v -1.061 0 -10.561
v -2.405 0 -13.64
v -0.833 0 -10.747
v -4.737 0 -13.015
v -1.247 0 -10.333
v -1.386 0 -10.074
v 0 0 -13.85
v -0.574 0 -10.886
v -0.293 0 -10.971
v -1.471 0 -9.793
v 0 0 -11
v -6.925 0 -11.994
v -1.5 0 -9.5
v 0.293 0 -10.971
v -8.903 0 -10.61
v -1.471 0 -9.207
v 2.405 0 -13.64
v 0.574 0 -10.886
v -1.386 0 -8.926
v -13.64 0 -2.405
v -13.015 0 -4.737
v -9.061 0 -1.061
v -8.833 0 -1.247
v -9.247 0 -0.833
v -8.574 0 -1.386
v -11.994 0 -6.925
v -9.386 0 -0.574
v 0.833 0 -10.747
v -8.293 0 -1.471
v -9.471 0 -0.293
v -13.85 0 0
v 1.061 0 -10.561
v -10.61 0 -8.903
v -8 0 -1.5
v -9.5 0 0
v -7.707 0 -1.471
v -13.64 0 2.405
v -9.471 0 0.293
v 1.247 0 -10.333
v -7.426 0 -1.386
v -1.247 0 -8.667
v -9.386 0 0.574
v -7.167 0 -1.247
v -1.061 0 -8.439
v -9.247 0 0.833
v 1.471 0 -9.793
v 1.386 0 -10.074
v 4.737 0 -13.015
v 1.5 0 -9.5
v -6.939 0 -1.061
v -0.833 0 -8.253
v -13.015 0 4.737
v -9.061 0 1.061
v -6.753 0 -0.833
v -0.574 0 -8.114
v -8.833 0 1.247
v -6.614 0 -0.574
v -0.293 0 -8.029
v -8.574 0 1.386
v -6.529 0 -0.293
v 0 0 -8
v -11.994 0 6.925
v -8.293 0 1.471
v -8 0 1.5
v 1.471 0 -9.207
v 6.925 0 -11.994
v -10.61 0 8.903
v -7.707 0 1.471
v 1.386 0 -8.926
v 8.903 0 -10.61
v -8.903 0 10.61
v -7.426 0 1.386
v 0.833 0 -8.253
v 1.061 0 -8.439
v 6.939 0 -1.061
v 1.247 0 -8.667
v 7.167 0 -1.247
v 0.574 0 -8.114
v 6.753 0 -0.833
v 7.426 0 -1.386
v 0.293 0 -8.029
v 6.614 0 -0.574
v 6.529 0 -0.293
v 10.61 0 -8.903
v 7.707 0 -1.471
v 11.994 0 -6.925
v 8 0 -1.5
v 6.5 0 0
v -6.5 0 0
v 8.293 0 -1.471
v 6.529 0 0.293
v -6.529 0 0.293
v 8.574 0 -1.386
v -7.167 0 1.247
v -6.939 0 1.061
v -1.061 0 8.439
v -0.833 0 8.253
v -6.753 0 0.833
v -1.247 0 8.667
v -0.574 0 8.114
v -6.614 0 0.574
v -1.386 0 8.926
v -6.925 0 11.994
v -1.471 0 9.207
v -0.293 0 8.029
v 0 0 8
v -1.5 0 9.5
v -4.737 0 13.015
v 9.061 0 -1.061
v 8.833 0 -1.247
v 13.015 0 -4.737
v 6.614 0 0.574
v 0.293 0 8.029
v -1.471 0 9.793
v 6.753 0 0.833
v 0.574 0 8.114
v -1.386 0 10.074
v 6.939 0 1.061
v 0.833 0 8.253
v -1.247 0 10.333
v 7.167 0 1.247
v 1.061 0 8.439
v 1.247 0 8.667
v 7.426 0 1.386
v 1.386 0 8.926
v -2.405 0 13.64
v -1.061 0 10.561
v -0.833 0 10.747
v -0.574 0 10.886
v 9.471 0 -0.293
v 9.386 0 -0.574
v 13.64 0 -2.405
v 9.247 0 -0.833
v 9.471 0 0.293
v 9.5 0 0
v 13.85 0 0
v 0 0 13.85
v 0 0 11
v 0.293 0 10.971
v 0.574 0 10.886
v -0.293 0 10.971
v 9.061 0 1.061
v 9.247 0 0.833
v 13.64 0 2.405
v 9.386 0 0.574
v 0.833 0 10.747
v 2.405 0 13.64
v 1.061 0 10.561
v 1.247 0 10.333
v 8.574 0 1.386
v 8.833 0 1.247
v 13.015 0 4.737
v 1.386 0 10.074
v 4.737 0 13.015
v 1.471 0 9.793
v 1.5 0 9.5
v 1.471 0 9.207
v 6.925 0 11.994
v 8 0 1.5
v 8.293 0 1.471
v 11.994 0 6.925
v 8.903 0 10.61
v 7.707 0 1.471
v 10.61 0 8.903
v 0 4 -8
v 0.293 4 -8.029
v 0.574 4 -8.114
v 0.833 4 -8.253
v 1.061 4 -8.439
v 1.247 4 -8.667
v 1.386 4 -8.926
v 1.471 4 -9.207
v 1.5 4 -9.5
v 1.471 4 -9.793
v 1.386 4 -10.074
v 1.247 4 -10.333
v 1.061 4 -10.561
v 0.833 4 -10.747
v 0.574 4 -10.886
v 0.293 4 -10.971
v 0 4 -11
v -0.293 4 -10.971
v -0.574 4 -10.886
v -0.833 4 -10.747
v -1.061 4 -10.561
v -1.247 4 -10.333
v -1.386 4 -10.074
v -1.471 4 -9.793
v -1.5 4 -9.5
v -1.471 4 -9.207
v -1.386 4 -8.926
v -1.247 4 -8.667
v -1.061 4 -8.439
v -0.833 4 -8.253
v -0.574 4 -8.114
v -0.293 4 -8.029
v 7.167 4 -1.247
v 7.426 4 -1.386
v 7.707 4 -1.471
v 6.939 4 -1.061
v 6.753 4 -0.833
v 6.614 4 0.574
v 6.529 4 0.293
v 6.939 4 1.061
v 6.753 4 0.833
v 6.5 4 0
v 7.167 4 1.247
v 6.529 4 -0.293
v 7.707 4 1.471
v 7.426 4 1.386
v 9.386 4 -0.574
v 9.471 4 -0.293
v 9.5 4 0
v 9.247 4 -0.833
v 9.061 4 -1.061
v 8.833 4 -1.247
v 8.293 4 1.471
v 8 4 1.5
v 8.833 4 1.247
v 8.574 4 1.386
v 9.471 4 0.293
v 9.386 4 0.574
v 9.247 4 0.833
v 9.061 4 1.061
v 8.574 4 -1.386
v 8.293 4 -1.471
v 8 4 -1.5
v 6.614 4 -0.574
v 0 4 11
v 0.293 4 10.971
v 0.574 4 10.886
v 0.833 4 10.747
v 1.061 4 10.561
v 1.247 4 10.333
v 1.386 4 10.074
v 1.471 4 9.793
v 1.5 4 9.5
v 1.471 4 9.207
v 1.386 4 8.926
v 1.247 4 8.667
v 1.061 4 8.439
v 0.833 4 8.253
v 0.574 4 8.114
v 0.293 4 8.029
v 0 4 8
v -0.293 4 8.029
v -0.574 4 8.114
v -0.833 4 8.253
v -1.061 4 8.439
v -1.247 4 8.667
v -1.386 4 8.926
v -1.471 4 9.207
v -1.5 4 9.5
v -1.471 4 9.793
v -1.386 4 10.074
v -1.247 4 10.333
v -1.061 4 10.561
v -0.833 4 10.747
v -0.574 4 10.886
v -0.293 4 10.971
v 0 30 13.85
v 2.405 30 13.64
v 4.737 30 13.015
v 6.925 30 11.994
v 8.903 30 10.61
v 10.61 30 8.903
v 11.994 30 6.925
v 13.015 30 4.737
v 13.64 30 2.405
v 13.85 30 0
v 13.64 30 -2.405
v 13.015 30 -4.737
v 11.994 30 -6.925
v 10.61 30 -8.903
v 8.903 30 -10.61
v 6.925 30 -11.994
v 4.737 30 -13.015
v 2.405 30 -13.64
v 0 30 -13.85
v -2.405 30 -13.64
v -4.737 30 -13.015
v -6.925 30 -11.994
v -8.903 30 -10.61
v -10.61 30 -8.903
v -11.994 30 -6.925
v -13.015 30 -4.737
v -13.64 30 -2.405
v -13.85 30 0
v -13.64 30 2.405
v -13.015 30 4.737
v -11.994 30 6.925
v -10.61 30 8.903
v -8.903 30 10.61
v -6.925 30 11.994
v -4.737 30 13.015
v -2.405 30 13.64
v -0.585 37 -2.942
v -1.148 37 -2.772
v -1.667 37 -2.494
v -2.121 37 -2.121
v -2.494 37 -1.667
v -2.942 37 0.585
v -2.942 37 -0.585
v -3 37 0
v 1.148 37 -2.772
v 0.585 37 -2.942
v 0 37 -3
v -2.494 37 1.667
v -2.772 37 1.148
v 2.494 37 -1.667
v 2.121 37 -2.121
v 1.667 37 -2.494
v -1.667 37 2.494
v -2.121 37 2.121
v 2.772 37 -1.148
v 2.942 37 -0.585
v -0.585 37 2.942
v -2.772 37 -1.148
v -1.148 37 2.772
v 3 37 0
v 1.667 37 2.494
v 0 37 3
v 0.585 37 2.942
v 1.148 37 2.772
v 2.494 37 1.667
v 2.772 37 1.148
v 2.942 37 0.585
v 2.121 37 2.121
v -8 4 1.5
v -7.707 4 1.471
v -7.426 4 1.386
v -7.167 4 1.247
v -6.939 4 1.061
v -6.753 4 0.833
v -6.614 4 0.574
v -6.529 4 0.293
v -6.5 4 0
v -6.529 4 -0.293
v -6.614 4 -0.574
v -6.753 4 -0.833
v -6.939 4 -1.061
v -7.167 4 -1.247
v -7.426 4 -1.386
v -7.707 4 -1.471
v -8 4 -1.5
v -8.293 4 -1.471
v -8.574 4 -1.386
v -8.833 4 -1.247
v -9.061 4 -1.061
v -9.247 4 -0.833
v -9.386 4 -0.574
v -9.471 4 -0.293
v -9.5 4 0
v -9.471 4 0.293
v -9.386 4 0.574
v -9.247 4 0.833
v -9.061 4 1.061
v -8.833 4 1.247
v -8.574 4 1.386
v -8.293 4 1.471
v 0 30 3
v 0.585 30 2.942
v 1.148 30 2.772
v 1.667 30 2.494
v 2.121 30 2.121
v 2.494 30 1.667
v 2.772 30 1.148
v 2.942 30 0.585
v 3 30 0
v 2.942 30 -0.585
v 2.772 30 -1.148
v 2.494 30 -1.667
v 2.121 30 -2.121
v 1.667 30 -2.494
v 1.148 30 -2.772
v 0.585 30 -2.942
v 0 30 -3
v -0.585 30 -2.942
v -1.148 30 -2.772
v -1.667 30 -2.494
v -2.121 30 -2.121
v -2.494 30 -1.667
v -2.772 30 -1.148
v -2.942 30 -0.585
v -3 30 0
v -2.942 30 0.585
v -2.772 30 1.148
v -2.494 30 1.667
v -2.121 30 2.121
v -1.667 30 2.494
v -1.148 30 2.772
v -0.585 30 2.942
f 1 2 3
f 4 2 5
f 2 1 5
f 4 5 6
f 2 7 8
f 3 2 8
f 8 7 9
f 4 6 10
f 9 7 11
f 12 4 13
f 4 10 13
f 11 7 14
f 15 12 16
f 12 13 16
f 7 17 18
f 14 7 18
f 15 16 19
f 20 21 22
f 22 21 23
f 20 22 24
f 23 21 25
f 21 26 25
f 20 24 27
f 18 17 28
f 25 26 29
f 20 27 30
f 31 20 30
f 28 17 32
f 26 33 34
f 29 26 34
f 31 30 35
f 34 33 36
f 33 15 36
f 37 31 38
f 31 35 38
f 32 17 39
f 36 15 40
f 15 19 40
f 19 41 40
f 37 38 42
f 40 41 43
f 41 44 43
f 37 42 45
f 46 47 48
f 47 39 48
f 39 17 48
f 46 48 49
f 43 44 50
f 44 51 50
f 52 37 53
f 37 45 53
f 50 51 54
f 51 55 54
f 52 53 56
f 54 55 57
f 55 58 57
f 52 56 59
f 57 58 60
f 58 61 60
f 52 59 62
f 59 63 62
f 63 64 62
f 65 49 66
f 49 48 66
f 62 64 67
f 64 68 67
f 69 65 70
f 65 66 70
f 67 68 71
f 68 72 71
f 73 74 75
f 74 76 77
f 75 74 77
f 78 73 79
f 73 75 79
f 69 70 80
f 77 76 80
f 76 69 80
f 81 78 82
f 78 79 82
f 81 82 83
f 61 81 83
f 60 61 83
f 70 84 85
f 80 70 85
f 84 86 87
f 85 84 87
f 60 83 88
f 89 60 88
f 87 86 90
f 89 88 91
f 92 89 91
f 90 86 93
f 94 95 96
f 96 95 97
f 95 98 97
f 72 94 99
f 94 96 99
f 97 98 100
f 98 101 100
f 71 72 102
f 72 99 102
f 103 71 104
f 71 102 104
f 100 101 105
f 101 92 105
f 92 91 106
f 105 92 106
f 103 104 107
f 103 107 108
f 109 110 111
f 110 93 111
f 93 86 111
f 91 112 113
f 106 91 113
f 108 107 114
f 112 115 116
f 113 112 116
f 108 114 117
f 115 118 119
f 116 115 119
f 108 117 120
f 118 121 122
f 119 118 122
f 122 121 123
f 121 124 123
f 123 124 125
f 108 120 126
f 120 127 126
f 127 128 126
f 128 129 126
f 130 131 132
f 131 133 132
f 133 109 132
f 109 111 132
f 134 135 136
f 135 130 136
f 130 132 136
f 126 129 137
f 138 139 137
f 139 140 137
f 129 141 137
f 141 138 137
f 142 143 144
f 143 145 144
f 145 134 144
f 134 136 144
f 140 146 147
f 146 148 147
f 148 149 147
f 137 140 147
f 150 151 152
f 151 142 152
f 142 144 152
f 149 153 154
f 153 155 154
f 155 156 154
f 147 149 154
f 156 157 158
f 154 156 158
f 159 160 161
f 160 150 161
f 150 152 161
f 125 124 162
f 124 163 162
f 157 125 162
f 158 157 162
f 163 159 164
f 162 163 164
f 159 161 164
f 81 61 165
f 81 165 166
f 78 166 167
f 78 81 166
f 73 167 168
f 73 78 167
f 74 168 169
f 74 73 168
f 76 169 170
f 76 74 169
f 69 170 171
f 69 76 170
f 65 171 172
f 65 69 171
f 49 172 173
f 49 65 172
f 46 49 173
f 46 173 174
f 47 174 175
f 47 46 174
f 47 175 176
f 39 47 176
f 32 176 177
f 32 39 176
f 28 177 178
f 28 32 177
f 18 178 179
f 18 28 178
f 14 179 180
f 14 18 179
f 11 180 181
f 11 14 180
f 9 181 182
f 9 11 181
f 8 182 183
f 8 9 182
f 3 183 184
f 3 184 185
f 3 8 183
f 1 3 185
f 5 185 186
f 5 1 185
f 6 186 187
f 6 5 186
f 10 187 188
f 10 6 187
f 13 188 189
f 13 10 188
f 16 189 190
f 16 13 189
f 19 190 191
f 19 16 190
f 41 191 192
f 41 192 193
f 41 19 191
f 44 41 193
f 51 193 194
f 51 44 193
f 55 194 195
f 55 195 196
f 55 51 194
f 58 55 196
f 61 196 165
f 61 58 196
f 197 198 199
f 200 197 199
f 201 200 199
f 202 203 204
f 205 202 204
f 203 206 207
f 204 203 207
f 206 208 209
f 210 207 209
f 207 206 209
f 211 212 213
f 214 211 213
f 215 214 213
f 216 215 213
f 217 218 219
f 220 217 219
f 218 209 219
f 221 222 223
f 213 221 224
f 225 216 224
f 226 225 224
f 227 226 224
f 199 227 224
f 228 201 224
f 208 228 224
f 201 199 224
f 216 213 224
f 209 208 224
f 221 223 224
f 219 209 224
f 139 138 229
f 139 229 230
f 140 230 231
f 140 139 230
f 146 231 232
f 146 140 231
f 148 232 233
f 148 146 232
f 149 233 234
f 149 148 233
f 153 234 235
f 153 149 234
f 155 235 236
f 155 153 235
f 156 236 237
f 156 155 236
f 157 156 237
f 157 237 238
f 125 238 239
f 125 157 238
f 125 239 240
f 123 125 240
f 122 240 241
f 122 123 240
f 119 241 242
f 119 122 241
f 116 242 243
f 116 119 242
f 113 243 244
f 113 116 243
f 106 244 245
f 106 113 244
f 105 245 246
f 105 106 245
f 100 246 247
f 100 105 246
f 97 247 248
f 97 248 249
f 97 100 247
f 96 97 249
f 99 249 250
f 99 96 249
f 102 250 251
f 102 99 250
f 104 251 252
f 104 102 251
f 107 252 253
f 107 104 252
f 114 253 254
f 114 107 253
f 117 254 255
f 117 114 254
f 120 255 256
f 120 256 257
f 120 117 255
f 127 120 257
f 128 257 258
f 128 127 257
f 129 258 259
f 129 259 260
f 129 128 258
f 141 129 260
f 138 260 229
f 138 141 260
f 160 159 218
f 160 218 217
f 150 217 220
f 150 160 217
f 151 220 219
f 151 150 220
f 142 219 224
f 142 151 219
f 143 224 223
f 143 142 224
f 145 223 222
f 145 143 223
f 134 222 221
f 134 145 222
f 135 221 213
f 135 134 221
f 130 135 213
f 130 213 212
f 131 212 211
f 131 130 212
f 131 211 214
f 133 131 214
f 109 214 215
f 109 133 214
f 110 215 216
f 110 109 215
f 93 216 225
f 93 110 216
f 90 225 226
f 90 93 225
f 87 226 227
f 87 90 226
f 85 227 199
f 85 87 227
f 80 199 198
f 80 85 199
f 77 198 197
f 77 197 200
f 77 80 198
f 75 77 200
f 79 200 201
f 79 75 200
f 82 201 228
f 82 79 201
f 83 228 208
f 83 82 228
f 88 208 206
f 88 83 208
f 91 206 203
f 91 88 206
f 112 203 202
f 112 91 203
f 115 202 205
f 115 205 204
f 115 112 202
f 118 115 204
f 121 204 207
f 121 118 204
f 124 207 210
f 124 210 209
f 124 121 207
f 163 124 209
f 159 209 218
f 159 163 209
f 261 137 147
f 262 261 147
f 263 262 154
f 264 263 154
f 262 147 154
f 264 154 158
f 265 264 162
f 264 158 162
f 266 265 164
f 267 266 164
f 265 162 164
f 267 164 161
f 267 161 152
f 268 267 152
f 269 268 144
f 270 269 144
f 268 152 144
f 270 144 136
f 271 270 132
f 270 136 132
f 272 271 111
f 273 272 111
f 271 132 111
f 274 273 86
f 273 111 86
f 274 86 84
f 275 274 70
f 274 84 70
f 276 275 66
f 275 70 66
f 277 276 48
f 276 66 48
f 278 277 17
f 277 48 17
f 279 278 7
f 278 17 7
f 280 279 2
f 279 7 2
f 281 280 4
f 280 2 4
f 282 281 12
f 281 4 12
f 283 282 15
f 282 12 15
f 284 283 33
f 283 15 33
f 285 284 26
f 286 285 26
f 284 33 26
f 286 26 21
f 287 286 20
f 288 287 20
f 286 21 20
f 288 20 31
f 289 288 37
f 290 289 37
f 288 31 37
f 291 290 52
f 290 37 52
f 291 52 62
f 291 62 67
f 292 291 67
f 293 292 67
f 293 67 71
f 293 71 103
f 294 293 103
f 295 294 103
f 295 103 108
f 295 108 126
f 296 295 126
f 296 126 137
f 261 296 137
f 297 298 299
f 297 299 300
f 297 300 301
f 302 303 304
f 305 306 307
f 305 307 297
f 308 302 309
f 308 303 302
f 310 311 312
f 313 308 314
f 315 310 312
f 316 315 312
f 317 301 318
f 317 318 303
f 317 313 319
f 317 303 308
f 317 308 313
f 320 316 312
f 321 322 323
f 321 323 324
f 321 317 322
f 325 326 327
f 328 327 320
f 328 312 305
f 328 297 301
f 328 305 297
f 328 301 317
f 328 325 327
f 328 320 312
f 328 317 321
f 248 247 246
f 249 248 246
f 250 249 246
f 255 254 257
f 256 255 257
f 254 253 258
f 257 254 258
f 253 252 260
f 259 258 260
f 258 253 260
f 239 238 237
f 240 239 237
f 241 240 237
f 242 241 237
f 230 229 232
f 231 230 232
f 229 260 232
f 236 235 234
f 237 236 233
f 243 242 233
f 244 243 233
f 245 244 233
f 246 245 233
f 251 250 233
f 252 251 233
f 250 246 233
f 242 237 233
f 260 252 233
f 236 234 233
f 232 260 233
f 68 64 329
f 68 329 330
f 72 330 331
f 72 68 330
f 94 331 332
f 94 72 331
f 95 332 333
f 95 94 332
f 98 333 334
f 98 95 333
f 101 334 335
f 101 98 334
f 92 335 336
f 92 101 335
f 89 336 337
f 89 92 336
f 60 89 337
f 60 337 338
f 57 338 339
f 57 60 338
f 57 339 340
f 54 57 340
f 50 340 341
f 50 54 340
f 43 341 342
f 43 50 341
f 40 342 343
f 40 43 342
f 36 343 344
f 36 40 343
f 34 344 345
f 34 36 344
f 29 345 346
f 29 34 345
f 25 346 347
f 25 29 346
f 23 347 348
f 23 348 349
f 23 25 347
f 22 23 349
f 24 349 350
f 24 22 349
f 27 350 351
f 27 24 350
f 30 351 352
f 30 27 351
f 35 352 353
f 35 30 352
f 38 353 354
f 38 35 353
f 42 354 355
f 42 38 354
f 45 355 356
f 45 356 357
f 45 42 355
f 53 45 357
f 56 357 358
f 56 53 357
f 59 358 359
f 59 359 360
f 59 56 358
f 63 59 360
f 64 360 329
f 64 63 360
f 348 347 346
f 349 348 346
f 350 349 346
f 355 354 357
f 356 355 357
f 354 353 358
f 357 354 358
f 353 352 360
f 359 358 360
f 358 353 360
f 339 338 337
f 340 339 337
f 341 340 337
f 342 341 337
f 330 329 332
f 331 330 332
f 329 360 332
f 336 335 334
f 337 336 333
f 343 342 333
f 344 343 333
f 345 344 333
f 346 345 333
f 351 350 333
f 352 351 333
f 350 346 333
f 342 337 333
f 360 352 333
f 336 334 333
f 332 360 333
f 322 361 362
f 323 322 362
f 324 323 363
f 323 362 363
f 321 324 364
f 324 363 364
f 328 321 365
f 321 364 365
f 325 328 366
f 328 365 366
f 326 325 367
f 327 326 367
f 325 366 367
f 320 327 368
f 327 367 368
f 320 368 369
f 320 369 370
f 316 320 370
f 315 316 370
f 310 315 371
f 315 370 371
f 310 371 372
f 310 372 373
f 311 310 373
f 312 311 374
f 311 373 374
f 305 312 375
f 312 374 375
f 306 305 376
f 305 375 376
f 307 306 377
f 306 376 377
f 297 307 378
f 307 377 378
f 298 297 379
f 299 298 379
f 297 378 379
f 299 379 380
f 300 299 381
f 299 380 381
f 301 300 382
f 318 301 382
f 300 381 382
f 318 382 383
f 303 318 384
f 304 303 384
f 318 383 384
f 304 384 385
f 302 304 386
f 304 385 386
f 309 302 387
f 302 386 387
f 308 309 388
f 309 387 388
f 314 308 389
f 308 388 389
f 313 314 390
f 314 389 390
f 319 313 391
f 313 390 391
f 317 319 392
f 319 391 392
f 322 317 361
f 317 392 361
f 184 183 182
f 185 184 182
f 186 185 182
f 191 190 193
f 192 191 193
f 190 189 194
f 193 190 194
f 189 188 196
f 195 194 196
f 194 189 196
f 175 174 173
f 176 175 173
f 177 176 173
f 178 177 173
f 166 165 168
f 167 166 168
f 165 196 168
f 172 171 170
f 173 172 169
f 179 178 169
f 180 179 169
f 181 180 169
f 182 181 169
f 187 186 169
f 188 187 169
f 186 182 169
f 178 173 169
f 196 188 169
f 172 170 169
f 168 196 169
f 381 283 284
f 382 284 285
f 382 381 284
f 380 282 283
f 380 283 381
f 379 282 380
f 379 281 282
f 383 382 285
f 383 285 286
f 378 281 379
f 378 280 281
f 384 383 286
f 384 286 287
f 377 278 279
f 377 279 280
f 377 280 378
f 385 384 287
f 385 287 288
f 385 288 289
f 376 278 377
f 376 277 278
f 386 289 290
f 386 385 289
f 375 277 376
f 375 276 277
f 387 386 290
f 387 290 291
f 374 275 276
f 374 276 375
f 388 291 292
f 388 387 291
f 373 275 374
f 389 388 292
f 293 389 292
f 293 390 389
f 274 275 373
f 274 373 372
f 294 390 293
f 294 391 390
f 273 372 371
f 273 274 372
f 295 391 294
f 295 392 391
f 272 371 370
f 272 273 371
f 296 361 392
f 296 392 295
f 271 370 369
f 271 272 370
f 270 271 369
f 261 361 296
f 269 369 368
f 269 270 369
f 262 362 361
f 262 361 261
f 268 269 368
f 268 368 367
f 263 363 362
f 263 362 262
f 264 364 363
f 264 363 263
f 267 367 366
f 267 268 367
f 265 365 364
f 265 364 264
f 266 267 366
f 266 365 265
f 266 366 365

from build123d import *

# Parameters (mm, degrees)
SKETCH1_R           = 13.85
BOSS_EXTRUDE1_DEPTH = 30
SKETCH2_R           = 3
BOSS_EXTRUDE2_DEPTH = 7
SKETCH3_R           = 1.5
CUT_EXTRUDE1_DEPTH  = 4


with BuildPart() as part:
    # Sketch1 → Boss-Extrude1 (new body)
    with BuildSketch(Plane(origin=(0, 0, 0), x_dir=(1, 0, 0), z_dir=(0, 1, 0))):
        Circle(SKETCH1_R)
    extrude(amount=BOSS_EXTRUDE1_DEPTH)

    # Sketch2 → Boss-Extrude2 (add)
    with BuildSketch(Plane(origin=(0, 30, 0), x_dir=(1, 0, 0), z_dir=(0, 1, 0))):
        Circle(SKETCH2_R)
    extrude(amount=BOSS_EXTRUDE2_DEPTH)

    # Sketch3 → Cut-Extrude1 (cut)
    with BuildSketch(Plane(origin=(0, 0, 0), x_dir=(1, 0, 0), z_dir=(0, 1, 0))):
        with Locations((8, 0)):
            Circle(SKETCH3_R)
        with Locations((-8, 0)):
            Circle(SKETCH3_R)
        with Locations((0, 9.5)):
            Circle(SKETCH3_R)
        with Locations((0, -9.5)):
            Circle(SKETCH3_R)
    extrude(amount=CUT_EXTRUDE1_DEPTH, mode=Mode.SUBTRACT)


solid = part.part
